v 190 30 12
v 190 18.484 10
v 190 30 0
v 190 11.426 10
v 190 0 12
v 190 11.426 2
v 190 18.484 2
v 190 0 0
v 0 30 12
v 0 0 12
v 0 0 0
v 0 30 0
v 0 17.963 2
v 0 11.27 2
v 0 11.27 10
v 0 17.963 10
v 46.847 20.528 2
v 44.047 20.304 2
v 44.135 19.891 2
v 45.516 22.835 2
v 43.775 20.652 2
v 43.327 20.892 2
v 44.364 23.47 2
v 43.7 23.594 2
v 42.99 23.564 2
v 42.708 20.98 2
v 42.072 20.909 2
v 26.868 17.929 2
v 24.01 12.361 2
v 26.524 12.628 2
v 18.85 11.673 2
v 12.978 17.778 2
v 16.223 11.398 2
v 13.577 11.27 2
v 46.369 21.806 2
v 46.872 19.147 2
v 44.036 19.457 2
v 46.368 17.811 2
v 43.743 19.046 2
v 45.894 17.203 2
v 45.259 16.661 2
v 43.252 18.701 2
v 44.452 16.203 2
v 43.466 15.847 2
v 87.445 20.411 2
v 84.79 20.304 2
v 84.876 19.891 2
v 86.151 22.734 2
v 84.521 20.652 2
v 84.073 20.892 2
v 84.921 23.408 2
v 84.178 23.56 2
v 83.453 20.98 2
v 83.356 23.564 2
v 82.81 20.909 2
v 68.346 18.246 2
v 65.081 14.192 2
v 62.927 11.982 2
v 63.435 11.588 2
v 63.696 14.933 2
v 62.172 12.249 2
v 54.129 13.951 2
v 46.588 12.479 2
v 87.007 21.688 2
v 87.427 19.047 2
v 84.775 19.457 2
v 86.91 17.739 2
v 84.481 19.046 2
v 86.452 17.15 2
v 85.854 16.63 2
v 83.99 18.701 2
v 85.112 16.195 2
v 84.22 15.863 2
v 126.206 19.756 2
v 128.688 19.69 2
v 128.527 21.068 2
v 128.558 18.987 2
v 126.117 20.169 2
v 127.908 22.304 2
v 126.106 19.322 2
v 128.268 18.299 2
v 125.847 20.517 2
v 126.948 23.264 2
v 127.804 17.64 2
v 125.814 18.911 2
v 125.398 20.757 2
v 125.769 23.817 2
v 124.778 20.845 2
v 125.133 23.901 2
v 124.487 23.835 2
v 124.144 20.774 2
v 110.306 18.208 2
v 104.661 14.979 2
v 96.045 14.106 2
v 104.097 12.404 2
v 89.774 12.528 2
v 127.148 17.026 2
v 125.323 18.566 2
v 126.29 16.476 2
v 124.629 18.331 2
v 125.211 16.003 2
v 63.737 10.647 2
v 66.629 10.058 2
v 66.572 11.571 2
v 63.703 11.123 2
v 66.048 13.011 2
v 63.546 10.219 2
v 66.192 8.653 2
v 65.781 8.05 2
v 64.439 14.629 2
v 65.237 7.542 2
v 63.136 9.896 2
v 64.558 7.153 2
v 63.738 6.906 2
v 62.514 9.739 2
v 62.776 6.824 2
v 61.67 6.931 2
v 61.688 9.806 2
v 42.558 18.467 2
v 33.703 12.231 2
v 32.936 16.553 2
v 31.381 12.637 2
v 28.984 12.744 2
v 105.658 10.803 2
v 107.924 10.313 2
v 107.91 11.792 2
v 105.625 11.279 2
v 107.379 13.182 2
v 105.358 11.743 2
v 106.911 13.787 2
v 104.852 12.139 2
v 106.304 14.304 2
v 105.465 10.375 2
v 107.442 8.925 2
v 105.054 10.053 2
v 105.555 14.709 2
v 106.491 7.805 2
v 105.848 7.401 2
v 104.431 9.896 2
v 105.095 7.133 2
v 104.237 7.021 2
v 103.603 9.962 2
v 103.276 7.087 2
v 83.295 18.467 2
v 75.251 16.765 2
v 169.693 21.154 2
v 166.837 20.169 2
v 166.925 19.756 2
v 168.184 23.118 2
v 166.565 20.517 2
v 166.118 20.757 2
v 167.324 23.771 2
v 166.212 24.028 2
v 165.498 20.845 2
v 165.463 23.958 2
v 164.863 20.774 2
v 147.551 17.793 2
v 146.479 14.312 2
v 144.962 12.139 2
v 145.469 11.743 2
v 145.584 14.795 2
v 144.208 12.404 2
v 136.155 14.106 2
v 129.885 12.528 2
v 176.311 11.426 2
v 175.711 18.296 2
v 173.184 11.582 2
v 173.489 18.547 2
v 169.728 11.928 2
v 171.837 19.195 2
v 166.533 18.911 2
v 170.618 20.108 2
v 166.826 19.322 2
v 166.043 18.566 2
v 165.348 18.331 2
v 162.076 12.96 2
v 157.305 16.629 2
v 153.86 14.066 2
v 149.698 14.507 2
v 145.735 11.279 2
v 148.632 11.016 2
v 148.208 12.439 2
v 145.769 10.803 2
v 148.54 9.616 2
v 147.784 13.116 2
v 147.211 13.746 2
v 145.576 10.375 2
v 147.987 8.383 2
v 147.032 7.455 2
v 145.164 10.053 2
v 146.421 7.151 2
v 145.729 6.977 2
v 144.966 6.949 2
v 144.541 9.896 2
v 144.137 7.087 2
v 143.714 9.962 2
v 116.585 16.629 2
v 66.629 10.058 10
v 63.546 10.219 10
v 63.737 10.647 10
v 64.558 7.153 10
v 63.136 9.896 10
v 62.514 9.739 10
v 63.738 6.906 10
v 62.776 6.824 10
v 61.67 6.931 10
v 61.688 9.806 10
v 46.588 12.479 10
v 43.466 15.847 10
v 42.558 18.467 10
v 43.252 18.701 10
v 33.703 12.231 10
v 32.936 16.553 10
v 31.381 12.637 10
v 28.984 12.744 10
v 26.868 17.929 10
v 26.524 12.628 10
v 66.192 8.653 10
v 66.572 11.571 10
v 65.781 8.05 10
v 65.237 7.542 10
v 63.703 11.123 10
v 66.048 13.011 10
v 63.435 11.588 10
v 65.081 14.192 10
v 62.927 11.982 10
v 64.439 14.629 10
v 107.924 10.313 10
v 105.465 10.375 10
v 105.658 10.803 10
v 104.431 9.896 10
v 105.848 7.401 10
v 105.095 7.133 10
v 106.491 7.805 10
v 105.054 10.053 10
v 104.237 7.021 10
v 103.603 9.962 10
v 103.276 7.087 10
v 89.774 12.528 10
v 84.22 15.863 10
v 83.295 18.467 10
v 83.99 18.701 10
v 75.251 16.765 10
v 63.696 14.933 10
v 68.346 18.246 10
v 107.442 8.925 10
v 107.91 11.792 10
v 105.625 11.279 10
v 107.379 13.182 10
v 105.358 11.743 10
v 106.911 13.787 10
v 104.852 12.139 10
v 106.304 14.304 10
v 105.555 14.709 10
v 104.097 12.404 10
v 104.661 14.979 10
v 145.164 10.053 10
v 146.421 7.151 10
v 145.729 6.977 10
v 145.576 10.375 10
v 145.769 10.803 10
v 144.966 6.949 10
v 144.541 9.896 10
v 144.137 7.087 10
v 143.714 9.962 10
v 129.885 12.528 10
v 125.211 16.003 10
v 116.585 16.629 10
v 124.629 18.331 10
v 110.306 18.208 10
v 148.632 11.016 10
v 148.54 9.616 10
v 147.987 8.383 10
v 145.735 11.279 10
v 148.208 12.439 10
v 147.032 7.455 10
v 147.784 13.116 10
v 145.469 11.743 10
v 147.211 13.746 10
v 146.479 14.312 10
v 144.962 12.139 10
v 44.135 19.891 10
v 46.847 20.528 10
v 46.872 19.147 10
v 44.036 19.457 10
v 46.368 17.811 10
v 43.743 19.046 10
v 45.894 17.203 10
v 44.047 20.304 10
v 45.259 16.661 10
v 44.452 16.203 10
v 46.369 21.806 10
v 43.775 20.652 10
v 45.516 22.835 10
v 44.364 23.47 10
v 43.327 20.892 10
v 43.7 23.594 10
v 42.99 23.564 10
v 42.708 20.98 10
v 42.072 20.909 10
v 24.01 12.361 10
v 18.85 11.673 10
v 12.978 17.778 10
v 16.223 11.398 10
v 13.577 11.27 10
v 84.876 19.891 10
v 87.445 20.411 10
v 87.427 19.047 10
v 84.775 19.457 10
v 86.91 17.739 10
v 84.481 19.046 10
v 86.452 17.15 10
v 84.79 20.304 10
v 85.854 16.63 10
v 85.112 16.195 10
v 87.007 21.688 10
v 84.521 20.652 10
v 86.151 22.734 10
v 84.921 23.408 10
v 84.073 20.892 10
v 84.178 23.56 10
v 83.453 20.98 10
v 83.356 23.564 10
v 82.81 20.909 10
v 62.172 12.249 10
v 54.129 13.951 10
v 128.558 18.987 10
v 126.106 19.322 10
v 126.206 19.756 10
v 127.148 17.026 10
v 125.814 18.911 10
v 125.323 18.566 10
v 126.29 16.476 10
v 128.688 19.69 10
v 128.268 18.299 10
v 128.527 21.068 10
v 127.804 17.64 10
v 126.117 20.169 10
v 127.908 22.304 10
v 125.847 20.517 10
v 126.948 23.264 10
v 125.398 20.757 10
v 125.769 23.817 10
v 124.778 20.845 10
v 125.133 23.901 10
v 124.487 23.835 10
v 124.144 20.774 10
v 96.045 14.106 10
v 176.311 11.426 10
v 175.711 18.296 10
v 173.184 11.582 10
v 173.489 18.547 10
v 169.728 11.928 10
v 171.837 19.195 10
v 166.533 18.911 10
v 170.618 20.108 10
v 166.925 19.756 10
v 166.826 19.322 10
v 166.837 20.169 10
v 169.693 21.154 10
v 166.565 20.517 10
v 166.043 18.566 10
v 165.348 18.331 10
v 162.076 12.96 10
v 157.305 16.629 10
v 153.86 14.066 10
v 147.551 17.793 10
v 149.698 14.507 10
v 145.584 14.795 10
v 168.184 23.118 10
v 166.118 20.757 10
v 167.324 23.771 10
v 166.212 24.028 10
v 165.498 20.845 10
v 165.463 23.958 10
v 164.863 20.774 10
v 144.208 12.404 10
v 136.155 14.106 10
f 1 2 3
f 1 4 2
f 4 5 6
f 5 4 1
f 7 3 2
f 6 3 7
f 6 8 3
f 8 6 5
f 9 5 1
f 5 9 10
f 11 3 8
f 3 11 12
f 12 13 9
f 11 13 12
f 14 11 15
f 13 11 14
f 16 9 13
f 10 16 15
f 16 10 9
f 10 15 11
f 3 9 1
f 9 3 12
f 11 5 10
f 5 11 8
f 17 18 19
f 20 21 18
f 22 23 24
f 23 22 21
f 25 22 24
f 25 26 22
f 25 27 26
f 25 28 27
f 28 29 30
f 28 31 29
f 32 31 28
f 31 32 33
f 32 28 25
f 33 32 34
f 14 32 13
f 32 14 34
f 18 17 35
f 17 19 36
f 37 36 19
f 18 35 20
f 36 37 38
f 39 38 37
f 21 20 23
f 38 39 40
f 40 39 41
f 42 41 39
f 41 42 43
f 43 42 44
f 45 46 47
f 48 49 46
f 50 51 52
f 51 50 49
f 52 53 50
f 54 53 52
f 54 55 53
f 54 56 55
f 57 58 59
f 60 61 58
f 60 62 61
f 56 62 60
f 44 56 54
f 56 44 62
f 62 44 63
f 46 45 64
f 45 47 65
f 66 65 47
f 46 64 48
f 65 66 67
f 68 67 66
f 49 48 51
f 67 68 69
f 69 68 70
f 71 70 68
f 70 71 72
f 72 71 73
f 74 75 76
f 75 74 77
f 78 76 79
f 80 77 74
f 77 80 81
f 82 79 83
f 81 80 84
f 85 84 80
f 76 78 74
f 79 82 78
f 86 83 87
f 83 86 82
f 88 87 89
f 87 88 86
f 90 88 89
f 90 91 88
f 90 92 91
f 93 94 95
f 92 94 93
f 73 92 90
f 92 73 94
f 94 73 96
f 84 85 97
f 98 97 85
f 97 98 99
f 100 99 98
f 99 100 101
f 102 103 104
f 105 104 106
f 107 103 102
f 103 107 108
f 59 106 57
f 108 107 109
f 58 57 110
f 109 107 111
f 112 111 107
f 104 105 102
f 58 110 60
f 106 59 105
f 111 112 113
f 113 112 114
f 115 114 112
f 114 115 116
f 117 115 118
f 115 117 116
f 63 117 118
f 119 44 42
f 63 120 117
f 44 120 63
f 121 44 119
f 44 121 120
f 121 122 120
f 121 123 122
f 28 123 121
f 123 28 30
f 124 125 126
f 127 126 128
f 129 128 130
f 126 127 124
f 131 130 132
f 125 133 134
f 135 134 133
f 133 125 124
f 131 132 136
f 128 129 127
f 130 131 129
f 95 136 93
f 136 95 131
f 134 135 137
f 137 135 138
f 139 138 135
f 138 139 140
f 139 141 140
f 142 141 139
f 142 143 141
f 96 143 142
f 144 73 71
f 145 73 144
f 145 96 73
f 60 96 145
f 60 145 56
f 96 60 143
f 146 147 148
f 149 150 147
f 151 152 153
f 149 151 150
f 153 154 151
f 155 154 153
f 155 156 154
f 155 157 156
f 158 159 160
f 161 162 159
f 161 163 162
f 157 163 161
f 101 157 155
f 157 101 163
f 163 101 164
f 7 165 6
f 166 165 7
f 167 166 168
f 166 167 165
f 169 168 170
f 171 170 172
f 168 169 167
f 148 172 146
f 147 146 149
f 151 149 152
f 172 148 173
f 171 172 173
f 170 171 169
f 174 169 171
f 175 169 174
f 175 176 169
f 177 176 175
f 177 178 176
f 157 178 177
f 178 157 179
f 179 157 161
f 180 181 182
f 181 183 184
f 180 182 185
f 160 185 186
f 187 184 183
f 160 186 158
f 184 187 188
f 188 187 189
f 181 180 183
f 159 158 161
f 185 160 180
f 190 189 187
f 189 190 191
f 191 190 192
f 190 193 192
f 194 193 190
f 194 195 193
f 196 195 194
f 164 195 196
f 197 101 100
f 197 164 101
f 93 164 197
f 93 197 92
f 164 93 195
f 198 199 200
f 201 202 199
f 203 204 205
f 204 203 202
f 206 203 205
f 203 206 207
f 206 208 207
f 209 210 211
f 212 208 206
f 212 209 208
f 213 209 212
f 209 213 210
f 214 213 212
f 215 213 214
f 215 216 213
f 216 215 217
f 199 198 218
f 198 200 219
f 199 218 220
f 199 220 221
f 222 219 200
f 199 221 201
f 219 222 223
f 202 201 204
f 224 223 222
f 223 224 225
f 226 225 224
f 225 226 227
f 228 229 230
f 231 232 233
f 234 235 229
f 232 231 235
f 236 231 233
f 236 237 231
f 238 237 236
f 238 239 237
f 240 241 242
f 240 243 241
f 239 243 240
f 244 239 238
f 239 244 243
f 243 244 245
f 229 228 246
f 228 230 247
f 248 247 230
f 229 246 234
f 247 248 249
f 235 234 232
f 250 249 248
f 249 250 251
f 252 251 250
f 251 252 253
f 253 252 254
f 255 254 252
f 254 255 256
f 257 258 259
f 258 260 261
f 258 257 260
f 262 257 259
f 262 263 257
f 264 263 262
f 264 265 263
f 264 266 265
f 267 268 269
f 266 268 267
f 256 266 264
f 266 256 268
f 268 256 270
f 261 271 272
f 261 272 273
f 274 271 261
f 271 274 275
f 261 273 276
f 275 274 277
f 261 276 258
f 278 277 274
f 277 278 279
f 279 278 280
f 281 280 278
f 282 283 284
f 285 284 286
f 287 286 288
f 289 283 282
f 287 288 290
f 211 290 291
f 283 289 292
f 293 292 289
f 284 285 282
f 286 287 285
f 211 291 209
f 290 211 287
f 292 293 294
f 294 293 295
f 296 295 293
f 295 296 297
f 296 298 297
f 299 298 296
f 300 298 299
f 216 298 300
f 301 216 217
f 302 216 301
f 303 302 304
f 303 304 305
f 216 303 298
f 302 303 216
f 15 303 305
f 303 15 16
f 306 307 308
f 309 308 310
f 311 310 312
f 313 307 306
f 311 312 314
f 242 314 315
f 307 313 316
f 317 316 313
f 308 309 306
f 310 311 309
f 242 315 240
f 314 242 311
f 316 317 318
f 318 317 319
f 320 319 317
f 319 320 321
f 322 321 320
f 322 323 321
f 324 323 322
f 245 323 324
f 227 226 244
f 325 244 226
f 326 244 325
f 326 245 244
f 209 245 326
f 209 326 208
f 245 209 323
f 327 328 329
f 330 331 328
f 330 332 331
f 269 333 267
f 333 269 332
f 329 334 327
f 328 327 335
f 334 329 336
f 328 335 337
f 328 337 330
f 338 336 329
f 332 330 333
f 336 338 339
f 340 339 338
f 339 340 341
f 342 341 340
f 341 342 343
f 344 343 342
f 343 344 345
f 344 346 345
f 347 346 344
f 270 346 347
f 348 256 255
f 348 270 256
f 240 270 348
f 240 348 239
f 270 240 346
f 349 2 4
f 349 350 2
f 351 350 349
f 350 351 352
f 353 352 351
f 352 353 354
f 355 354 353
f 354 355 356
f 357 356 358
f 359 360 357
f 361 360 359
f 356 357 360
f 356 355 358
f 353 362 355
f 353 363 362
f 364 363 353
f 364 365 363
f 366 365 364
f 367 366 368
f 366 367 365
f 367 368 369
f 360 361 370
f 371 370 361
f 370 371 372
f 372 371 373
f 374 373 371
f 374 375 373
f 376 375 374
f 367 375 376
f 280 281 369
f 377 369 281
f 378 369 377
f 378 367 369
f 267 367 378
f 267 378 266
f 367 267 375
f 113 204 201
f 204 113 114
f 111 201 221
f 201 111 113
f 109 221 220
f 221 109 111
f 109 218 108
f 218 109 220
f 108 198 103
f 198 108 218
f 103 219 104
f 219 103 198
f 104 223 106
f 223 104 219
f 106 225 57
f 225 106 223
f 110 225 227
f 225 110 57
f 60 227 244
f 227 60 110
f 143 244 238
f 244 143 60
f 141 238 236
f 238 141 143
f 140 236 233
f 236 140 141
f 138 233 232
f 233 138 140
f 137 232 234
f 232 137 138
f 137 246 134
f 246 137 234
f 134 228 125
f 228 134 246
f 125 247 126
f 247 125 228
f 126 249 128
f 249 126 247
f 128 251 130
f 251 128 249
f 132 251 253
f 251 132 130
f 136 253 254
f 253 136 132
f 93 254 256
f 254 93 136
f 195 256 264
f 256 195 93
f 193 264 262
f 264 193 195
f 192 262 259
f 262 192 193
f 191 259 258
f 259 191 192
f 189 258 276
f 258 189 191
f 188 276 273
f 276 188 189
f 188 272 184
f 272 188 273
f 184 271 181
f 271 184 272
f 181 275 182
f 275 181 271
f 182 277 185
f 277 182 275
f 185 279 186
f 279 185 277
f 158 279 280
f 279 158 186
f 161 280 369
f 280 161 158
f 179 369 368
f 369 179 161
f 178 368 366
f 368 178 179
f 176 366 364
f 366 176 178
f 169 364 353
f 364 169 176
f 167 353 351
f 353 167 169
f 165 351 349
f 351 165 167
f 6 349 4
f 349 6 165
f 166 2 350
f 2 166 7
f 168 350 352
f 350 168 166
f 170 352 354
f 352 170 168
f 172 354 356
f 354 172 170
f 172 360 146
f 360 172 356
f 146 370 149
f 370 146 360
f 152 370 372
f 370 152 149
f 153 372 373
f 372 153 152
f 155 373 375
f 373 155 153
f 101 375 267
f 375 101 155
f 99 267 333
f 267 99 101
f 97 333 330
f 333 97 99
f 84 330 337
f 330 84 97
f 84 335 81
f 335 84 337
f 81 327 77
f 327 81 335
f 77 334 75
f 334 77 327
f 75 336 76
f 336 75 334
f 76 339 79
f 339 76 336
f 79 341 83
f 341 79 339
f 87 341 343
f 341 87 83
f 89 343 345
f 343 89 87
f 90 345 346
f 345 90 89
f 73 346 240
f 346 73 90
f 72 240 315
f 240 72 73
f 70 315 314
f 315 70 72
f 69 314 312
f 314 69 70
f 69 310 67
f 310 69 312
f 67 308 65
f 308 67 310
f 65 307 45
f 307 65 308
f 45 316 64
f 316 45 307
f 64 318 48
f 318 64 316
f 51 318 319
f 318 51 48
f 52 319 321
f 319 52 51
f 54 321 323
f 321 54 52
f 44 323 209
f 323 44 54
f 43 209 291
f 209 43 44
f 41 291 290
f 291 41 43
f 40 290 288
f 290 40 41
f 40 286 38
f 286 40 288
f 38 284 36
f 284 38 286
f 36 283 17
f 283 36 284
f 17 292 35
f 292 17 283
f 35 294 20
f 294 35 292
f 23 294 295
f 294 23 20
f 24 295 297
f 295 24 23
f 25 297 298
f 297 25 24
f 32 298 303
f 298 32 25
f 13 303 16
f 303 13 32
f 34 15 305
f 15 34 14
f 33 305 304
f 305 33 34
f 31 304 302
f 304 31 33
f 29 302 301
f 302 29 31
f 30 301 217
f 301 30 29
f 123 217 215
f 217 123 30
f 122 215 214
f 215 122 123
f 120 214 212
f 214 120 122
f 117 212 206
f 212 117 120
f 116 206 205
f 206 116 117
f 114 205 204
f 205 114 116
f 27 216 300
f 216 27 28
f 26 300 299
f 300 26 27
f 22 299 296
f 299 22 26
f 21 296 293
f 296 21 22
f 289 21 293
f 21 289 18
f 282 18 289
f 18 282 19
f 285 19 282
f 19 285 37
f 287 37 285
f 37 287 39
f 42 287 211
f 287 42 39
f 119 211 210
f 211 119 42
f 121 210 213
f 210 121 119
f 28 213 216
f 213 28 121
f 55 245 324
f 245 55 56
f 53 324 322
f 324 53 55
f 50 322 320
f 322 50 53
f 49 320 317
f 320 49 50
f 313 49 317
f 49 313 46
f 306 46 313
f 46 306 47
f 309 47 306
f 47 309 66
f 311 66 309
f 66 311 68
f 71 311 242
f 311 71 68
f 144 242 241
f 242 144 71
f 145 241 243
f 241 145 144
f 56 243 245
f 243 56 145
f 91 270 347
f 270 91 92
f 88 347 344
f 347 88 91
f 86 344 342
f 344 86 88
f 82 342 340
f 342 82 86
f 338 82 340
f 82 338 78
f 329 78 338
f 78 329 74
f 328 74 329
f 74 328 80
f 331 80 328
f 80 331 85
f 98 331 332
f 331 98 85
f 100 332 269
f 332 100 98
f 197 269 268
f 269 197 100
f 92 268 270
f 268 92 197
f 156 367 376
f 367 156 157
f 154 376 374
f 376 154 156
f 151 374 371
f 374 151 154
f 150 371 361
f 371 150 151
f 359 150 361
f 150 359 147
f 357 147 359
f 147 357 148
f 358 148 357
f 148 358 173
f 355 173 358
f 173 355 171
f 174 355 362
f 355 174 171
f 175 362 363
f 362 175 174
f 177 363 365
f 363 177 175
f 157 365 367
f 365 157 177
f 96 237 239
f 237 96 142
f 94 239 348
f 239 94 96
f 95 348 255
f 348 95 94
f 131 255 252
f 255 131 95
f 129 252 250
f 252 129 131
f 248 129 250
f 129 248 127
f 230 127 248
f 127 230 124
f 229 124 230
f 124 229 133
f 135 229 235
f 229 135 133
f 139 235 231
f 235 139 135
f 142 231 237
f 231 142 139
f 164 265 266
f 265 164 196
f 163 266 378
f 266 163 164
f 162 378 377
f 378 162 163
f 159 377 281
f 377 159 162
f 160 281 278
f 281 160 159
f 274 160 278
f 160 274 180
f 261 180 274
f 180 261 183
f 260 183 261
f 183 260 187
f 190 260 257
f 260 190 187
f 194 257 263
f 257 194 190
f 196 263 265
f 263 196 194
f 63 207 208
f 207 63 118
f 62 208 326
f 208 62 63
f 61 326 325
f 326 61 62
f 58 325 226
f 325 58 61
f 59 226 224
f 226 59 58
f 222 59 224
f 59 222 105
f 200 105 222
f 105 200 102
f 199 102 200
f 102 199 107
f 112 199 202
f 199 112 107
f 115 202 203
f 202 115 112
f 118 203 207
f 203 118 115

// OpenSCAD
valve();

module valve() {
    difference() {
        cube([190,30,12]);
        translate([-55,188+15,2])linear_extrude(8) import("valveShape.dxf");
    }
}
